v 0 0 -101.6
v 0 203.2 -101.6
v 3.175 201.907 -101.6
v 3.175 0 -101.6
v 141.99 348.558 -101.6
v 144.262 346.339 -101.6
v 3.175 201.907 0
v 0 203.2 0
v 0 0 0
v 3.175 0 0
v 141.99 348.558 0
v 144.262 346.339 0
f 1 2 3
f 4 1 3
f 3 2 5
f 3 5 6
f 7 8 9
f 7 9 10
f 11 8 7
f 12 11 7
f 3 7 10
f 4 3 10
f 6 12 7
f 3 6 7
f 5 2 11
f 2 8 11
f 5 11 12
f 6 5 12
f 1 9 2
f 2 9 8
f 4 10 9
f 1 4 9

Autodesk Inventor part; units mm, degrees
ref_plane "YZ Plane" through (0, 0, 0) normal (1, 0, 0) x (0, 1, 0)
ref_plane "XZ Plane" through (0, 0, 0) normal (0, 1, 0) x (-1, 0, 0)
ref_plane "XY Plane" through (0, 0, 0) normal (0, 0, 1) x (1, 0, 0)
sketch "Sketch1" plane through (0, 0, 0) normal (0, 0, 1) x (1, 0, 0)
  line L0 (0, 0) -> (0, 203.2)
  line L1 (0, 203.2) -> (141.9905, 348.5579)
  line L2 (141.9905, 348.5579) -> (144.2617, 346.3393)
  line L3 (144.2617, 346.3393) -> (3.175, 201.9066)
  line L4 (3.175, 201.9066) -> (3.175, 0)
  line L5 (3.175, 0) -> (0, 0)
  dimension "d0" = 3.175
  dimension "d1" = 3.175
  dimension "d2" = 203.2
  dimension "d3" = 203.2
extrude "Extrusion1" add sketch "Sketch1" against normal blind 101.6
properties part number "backing"
